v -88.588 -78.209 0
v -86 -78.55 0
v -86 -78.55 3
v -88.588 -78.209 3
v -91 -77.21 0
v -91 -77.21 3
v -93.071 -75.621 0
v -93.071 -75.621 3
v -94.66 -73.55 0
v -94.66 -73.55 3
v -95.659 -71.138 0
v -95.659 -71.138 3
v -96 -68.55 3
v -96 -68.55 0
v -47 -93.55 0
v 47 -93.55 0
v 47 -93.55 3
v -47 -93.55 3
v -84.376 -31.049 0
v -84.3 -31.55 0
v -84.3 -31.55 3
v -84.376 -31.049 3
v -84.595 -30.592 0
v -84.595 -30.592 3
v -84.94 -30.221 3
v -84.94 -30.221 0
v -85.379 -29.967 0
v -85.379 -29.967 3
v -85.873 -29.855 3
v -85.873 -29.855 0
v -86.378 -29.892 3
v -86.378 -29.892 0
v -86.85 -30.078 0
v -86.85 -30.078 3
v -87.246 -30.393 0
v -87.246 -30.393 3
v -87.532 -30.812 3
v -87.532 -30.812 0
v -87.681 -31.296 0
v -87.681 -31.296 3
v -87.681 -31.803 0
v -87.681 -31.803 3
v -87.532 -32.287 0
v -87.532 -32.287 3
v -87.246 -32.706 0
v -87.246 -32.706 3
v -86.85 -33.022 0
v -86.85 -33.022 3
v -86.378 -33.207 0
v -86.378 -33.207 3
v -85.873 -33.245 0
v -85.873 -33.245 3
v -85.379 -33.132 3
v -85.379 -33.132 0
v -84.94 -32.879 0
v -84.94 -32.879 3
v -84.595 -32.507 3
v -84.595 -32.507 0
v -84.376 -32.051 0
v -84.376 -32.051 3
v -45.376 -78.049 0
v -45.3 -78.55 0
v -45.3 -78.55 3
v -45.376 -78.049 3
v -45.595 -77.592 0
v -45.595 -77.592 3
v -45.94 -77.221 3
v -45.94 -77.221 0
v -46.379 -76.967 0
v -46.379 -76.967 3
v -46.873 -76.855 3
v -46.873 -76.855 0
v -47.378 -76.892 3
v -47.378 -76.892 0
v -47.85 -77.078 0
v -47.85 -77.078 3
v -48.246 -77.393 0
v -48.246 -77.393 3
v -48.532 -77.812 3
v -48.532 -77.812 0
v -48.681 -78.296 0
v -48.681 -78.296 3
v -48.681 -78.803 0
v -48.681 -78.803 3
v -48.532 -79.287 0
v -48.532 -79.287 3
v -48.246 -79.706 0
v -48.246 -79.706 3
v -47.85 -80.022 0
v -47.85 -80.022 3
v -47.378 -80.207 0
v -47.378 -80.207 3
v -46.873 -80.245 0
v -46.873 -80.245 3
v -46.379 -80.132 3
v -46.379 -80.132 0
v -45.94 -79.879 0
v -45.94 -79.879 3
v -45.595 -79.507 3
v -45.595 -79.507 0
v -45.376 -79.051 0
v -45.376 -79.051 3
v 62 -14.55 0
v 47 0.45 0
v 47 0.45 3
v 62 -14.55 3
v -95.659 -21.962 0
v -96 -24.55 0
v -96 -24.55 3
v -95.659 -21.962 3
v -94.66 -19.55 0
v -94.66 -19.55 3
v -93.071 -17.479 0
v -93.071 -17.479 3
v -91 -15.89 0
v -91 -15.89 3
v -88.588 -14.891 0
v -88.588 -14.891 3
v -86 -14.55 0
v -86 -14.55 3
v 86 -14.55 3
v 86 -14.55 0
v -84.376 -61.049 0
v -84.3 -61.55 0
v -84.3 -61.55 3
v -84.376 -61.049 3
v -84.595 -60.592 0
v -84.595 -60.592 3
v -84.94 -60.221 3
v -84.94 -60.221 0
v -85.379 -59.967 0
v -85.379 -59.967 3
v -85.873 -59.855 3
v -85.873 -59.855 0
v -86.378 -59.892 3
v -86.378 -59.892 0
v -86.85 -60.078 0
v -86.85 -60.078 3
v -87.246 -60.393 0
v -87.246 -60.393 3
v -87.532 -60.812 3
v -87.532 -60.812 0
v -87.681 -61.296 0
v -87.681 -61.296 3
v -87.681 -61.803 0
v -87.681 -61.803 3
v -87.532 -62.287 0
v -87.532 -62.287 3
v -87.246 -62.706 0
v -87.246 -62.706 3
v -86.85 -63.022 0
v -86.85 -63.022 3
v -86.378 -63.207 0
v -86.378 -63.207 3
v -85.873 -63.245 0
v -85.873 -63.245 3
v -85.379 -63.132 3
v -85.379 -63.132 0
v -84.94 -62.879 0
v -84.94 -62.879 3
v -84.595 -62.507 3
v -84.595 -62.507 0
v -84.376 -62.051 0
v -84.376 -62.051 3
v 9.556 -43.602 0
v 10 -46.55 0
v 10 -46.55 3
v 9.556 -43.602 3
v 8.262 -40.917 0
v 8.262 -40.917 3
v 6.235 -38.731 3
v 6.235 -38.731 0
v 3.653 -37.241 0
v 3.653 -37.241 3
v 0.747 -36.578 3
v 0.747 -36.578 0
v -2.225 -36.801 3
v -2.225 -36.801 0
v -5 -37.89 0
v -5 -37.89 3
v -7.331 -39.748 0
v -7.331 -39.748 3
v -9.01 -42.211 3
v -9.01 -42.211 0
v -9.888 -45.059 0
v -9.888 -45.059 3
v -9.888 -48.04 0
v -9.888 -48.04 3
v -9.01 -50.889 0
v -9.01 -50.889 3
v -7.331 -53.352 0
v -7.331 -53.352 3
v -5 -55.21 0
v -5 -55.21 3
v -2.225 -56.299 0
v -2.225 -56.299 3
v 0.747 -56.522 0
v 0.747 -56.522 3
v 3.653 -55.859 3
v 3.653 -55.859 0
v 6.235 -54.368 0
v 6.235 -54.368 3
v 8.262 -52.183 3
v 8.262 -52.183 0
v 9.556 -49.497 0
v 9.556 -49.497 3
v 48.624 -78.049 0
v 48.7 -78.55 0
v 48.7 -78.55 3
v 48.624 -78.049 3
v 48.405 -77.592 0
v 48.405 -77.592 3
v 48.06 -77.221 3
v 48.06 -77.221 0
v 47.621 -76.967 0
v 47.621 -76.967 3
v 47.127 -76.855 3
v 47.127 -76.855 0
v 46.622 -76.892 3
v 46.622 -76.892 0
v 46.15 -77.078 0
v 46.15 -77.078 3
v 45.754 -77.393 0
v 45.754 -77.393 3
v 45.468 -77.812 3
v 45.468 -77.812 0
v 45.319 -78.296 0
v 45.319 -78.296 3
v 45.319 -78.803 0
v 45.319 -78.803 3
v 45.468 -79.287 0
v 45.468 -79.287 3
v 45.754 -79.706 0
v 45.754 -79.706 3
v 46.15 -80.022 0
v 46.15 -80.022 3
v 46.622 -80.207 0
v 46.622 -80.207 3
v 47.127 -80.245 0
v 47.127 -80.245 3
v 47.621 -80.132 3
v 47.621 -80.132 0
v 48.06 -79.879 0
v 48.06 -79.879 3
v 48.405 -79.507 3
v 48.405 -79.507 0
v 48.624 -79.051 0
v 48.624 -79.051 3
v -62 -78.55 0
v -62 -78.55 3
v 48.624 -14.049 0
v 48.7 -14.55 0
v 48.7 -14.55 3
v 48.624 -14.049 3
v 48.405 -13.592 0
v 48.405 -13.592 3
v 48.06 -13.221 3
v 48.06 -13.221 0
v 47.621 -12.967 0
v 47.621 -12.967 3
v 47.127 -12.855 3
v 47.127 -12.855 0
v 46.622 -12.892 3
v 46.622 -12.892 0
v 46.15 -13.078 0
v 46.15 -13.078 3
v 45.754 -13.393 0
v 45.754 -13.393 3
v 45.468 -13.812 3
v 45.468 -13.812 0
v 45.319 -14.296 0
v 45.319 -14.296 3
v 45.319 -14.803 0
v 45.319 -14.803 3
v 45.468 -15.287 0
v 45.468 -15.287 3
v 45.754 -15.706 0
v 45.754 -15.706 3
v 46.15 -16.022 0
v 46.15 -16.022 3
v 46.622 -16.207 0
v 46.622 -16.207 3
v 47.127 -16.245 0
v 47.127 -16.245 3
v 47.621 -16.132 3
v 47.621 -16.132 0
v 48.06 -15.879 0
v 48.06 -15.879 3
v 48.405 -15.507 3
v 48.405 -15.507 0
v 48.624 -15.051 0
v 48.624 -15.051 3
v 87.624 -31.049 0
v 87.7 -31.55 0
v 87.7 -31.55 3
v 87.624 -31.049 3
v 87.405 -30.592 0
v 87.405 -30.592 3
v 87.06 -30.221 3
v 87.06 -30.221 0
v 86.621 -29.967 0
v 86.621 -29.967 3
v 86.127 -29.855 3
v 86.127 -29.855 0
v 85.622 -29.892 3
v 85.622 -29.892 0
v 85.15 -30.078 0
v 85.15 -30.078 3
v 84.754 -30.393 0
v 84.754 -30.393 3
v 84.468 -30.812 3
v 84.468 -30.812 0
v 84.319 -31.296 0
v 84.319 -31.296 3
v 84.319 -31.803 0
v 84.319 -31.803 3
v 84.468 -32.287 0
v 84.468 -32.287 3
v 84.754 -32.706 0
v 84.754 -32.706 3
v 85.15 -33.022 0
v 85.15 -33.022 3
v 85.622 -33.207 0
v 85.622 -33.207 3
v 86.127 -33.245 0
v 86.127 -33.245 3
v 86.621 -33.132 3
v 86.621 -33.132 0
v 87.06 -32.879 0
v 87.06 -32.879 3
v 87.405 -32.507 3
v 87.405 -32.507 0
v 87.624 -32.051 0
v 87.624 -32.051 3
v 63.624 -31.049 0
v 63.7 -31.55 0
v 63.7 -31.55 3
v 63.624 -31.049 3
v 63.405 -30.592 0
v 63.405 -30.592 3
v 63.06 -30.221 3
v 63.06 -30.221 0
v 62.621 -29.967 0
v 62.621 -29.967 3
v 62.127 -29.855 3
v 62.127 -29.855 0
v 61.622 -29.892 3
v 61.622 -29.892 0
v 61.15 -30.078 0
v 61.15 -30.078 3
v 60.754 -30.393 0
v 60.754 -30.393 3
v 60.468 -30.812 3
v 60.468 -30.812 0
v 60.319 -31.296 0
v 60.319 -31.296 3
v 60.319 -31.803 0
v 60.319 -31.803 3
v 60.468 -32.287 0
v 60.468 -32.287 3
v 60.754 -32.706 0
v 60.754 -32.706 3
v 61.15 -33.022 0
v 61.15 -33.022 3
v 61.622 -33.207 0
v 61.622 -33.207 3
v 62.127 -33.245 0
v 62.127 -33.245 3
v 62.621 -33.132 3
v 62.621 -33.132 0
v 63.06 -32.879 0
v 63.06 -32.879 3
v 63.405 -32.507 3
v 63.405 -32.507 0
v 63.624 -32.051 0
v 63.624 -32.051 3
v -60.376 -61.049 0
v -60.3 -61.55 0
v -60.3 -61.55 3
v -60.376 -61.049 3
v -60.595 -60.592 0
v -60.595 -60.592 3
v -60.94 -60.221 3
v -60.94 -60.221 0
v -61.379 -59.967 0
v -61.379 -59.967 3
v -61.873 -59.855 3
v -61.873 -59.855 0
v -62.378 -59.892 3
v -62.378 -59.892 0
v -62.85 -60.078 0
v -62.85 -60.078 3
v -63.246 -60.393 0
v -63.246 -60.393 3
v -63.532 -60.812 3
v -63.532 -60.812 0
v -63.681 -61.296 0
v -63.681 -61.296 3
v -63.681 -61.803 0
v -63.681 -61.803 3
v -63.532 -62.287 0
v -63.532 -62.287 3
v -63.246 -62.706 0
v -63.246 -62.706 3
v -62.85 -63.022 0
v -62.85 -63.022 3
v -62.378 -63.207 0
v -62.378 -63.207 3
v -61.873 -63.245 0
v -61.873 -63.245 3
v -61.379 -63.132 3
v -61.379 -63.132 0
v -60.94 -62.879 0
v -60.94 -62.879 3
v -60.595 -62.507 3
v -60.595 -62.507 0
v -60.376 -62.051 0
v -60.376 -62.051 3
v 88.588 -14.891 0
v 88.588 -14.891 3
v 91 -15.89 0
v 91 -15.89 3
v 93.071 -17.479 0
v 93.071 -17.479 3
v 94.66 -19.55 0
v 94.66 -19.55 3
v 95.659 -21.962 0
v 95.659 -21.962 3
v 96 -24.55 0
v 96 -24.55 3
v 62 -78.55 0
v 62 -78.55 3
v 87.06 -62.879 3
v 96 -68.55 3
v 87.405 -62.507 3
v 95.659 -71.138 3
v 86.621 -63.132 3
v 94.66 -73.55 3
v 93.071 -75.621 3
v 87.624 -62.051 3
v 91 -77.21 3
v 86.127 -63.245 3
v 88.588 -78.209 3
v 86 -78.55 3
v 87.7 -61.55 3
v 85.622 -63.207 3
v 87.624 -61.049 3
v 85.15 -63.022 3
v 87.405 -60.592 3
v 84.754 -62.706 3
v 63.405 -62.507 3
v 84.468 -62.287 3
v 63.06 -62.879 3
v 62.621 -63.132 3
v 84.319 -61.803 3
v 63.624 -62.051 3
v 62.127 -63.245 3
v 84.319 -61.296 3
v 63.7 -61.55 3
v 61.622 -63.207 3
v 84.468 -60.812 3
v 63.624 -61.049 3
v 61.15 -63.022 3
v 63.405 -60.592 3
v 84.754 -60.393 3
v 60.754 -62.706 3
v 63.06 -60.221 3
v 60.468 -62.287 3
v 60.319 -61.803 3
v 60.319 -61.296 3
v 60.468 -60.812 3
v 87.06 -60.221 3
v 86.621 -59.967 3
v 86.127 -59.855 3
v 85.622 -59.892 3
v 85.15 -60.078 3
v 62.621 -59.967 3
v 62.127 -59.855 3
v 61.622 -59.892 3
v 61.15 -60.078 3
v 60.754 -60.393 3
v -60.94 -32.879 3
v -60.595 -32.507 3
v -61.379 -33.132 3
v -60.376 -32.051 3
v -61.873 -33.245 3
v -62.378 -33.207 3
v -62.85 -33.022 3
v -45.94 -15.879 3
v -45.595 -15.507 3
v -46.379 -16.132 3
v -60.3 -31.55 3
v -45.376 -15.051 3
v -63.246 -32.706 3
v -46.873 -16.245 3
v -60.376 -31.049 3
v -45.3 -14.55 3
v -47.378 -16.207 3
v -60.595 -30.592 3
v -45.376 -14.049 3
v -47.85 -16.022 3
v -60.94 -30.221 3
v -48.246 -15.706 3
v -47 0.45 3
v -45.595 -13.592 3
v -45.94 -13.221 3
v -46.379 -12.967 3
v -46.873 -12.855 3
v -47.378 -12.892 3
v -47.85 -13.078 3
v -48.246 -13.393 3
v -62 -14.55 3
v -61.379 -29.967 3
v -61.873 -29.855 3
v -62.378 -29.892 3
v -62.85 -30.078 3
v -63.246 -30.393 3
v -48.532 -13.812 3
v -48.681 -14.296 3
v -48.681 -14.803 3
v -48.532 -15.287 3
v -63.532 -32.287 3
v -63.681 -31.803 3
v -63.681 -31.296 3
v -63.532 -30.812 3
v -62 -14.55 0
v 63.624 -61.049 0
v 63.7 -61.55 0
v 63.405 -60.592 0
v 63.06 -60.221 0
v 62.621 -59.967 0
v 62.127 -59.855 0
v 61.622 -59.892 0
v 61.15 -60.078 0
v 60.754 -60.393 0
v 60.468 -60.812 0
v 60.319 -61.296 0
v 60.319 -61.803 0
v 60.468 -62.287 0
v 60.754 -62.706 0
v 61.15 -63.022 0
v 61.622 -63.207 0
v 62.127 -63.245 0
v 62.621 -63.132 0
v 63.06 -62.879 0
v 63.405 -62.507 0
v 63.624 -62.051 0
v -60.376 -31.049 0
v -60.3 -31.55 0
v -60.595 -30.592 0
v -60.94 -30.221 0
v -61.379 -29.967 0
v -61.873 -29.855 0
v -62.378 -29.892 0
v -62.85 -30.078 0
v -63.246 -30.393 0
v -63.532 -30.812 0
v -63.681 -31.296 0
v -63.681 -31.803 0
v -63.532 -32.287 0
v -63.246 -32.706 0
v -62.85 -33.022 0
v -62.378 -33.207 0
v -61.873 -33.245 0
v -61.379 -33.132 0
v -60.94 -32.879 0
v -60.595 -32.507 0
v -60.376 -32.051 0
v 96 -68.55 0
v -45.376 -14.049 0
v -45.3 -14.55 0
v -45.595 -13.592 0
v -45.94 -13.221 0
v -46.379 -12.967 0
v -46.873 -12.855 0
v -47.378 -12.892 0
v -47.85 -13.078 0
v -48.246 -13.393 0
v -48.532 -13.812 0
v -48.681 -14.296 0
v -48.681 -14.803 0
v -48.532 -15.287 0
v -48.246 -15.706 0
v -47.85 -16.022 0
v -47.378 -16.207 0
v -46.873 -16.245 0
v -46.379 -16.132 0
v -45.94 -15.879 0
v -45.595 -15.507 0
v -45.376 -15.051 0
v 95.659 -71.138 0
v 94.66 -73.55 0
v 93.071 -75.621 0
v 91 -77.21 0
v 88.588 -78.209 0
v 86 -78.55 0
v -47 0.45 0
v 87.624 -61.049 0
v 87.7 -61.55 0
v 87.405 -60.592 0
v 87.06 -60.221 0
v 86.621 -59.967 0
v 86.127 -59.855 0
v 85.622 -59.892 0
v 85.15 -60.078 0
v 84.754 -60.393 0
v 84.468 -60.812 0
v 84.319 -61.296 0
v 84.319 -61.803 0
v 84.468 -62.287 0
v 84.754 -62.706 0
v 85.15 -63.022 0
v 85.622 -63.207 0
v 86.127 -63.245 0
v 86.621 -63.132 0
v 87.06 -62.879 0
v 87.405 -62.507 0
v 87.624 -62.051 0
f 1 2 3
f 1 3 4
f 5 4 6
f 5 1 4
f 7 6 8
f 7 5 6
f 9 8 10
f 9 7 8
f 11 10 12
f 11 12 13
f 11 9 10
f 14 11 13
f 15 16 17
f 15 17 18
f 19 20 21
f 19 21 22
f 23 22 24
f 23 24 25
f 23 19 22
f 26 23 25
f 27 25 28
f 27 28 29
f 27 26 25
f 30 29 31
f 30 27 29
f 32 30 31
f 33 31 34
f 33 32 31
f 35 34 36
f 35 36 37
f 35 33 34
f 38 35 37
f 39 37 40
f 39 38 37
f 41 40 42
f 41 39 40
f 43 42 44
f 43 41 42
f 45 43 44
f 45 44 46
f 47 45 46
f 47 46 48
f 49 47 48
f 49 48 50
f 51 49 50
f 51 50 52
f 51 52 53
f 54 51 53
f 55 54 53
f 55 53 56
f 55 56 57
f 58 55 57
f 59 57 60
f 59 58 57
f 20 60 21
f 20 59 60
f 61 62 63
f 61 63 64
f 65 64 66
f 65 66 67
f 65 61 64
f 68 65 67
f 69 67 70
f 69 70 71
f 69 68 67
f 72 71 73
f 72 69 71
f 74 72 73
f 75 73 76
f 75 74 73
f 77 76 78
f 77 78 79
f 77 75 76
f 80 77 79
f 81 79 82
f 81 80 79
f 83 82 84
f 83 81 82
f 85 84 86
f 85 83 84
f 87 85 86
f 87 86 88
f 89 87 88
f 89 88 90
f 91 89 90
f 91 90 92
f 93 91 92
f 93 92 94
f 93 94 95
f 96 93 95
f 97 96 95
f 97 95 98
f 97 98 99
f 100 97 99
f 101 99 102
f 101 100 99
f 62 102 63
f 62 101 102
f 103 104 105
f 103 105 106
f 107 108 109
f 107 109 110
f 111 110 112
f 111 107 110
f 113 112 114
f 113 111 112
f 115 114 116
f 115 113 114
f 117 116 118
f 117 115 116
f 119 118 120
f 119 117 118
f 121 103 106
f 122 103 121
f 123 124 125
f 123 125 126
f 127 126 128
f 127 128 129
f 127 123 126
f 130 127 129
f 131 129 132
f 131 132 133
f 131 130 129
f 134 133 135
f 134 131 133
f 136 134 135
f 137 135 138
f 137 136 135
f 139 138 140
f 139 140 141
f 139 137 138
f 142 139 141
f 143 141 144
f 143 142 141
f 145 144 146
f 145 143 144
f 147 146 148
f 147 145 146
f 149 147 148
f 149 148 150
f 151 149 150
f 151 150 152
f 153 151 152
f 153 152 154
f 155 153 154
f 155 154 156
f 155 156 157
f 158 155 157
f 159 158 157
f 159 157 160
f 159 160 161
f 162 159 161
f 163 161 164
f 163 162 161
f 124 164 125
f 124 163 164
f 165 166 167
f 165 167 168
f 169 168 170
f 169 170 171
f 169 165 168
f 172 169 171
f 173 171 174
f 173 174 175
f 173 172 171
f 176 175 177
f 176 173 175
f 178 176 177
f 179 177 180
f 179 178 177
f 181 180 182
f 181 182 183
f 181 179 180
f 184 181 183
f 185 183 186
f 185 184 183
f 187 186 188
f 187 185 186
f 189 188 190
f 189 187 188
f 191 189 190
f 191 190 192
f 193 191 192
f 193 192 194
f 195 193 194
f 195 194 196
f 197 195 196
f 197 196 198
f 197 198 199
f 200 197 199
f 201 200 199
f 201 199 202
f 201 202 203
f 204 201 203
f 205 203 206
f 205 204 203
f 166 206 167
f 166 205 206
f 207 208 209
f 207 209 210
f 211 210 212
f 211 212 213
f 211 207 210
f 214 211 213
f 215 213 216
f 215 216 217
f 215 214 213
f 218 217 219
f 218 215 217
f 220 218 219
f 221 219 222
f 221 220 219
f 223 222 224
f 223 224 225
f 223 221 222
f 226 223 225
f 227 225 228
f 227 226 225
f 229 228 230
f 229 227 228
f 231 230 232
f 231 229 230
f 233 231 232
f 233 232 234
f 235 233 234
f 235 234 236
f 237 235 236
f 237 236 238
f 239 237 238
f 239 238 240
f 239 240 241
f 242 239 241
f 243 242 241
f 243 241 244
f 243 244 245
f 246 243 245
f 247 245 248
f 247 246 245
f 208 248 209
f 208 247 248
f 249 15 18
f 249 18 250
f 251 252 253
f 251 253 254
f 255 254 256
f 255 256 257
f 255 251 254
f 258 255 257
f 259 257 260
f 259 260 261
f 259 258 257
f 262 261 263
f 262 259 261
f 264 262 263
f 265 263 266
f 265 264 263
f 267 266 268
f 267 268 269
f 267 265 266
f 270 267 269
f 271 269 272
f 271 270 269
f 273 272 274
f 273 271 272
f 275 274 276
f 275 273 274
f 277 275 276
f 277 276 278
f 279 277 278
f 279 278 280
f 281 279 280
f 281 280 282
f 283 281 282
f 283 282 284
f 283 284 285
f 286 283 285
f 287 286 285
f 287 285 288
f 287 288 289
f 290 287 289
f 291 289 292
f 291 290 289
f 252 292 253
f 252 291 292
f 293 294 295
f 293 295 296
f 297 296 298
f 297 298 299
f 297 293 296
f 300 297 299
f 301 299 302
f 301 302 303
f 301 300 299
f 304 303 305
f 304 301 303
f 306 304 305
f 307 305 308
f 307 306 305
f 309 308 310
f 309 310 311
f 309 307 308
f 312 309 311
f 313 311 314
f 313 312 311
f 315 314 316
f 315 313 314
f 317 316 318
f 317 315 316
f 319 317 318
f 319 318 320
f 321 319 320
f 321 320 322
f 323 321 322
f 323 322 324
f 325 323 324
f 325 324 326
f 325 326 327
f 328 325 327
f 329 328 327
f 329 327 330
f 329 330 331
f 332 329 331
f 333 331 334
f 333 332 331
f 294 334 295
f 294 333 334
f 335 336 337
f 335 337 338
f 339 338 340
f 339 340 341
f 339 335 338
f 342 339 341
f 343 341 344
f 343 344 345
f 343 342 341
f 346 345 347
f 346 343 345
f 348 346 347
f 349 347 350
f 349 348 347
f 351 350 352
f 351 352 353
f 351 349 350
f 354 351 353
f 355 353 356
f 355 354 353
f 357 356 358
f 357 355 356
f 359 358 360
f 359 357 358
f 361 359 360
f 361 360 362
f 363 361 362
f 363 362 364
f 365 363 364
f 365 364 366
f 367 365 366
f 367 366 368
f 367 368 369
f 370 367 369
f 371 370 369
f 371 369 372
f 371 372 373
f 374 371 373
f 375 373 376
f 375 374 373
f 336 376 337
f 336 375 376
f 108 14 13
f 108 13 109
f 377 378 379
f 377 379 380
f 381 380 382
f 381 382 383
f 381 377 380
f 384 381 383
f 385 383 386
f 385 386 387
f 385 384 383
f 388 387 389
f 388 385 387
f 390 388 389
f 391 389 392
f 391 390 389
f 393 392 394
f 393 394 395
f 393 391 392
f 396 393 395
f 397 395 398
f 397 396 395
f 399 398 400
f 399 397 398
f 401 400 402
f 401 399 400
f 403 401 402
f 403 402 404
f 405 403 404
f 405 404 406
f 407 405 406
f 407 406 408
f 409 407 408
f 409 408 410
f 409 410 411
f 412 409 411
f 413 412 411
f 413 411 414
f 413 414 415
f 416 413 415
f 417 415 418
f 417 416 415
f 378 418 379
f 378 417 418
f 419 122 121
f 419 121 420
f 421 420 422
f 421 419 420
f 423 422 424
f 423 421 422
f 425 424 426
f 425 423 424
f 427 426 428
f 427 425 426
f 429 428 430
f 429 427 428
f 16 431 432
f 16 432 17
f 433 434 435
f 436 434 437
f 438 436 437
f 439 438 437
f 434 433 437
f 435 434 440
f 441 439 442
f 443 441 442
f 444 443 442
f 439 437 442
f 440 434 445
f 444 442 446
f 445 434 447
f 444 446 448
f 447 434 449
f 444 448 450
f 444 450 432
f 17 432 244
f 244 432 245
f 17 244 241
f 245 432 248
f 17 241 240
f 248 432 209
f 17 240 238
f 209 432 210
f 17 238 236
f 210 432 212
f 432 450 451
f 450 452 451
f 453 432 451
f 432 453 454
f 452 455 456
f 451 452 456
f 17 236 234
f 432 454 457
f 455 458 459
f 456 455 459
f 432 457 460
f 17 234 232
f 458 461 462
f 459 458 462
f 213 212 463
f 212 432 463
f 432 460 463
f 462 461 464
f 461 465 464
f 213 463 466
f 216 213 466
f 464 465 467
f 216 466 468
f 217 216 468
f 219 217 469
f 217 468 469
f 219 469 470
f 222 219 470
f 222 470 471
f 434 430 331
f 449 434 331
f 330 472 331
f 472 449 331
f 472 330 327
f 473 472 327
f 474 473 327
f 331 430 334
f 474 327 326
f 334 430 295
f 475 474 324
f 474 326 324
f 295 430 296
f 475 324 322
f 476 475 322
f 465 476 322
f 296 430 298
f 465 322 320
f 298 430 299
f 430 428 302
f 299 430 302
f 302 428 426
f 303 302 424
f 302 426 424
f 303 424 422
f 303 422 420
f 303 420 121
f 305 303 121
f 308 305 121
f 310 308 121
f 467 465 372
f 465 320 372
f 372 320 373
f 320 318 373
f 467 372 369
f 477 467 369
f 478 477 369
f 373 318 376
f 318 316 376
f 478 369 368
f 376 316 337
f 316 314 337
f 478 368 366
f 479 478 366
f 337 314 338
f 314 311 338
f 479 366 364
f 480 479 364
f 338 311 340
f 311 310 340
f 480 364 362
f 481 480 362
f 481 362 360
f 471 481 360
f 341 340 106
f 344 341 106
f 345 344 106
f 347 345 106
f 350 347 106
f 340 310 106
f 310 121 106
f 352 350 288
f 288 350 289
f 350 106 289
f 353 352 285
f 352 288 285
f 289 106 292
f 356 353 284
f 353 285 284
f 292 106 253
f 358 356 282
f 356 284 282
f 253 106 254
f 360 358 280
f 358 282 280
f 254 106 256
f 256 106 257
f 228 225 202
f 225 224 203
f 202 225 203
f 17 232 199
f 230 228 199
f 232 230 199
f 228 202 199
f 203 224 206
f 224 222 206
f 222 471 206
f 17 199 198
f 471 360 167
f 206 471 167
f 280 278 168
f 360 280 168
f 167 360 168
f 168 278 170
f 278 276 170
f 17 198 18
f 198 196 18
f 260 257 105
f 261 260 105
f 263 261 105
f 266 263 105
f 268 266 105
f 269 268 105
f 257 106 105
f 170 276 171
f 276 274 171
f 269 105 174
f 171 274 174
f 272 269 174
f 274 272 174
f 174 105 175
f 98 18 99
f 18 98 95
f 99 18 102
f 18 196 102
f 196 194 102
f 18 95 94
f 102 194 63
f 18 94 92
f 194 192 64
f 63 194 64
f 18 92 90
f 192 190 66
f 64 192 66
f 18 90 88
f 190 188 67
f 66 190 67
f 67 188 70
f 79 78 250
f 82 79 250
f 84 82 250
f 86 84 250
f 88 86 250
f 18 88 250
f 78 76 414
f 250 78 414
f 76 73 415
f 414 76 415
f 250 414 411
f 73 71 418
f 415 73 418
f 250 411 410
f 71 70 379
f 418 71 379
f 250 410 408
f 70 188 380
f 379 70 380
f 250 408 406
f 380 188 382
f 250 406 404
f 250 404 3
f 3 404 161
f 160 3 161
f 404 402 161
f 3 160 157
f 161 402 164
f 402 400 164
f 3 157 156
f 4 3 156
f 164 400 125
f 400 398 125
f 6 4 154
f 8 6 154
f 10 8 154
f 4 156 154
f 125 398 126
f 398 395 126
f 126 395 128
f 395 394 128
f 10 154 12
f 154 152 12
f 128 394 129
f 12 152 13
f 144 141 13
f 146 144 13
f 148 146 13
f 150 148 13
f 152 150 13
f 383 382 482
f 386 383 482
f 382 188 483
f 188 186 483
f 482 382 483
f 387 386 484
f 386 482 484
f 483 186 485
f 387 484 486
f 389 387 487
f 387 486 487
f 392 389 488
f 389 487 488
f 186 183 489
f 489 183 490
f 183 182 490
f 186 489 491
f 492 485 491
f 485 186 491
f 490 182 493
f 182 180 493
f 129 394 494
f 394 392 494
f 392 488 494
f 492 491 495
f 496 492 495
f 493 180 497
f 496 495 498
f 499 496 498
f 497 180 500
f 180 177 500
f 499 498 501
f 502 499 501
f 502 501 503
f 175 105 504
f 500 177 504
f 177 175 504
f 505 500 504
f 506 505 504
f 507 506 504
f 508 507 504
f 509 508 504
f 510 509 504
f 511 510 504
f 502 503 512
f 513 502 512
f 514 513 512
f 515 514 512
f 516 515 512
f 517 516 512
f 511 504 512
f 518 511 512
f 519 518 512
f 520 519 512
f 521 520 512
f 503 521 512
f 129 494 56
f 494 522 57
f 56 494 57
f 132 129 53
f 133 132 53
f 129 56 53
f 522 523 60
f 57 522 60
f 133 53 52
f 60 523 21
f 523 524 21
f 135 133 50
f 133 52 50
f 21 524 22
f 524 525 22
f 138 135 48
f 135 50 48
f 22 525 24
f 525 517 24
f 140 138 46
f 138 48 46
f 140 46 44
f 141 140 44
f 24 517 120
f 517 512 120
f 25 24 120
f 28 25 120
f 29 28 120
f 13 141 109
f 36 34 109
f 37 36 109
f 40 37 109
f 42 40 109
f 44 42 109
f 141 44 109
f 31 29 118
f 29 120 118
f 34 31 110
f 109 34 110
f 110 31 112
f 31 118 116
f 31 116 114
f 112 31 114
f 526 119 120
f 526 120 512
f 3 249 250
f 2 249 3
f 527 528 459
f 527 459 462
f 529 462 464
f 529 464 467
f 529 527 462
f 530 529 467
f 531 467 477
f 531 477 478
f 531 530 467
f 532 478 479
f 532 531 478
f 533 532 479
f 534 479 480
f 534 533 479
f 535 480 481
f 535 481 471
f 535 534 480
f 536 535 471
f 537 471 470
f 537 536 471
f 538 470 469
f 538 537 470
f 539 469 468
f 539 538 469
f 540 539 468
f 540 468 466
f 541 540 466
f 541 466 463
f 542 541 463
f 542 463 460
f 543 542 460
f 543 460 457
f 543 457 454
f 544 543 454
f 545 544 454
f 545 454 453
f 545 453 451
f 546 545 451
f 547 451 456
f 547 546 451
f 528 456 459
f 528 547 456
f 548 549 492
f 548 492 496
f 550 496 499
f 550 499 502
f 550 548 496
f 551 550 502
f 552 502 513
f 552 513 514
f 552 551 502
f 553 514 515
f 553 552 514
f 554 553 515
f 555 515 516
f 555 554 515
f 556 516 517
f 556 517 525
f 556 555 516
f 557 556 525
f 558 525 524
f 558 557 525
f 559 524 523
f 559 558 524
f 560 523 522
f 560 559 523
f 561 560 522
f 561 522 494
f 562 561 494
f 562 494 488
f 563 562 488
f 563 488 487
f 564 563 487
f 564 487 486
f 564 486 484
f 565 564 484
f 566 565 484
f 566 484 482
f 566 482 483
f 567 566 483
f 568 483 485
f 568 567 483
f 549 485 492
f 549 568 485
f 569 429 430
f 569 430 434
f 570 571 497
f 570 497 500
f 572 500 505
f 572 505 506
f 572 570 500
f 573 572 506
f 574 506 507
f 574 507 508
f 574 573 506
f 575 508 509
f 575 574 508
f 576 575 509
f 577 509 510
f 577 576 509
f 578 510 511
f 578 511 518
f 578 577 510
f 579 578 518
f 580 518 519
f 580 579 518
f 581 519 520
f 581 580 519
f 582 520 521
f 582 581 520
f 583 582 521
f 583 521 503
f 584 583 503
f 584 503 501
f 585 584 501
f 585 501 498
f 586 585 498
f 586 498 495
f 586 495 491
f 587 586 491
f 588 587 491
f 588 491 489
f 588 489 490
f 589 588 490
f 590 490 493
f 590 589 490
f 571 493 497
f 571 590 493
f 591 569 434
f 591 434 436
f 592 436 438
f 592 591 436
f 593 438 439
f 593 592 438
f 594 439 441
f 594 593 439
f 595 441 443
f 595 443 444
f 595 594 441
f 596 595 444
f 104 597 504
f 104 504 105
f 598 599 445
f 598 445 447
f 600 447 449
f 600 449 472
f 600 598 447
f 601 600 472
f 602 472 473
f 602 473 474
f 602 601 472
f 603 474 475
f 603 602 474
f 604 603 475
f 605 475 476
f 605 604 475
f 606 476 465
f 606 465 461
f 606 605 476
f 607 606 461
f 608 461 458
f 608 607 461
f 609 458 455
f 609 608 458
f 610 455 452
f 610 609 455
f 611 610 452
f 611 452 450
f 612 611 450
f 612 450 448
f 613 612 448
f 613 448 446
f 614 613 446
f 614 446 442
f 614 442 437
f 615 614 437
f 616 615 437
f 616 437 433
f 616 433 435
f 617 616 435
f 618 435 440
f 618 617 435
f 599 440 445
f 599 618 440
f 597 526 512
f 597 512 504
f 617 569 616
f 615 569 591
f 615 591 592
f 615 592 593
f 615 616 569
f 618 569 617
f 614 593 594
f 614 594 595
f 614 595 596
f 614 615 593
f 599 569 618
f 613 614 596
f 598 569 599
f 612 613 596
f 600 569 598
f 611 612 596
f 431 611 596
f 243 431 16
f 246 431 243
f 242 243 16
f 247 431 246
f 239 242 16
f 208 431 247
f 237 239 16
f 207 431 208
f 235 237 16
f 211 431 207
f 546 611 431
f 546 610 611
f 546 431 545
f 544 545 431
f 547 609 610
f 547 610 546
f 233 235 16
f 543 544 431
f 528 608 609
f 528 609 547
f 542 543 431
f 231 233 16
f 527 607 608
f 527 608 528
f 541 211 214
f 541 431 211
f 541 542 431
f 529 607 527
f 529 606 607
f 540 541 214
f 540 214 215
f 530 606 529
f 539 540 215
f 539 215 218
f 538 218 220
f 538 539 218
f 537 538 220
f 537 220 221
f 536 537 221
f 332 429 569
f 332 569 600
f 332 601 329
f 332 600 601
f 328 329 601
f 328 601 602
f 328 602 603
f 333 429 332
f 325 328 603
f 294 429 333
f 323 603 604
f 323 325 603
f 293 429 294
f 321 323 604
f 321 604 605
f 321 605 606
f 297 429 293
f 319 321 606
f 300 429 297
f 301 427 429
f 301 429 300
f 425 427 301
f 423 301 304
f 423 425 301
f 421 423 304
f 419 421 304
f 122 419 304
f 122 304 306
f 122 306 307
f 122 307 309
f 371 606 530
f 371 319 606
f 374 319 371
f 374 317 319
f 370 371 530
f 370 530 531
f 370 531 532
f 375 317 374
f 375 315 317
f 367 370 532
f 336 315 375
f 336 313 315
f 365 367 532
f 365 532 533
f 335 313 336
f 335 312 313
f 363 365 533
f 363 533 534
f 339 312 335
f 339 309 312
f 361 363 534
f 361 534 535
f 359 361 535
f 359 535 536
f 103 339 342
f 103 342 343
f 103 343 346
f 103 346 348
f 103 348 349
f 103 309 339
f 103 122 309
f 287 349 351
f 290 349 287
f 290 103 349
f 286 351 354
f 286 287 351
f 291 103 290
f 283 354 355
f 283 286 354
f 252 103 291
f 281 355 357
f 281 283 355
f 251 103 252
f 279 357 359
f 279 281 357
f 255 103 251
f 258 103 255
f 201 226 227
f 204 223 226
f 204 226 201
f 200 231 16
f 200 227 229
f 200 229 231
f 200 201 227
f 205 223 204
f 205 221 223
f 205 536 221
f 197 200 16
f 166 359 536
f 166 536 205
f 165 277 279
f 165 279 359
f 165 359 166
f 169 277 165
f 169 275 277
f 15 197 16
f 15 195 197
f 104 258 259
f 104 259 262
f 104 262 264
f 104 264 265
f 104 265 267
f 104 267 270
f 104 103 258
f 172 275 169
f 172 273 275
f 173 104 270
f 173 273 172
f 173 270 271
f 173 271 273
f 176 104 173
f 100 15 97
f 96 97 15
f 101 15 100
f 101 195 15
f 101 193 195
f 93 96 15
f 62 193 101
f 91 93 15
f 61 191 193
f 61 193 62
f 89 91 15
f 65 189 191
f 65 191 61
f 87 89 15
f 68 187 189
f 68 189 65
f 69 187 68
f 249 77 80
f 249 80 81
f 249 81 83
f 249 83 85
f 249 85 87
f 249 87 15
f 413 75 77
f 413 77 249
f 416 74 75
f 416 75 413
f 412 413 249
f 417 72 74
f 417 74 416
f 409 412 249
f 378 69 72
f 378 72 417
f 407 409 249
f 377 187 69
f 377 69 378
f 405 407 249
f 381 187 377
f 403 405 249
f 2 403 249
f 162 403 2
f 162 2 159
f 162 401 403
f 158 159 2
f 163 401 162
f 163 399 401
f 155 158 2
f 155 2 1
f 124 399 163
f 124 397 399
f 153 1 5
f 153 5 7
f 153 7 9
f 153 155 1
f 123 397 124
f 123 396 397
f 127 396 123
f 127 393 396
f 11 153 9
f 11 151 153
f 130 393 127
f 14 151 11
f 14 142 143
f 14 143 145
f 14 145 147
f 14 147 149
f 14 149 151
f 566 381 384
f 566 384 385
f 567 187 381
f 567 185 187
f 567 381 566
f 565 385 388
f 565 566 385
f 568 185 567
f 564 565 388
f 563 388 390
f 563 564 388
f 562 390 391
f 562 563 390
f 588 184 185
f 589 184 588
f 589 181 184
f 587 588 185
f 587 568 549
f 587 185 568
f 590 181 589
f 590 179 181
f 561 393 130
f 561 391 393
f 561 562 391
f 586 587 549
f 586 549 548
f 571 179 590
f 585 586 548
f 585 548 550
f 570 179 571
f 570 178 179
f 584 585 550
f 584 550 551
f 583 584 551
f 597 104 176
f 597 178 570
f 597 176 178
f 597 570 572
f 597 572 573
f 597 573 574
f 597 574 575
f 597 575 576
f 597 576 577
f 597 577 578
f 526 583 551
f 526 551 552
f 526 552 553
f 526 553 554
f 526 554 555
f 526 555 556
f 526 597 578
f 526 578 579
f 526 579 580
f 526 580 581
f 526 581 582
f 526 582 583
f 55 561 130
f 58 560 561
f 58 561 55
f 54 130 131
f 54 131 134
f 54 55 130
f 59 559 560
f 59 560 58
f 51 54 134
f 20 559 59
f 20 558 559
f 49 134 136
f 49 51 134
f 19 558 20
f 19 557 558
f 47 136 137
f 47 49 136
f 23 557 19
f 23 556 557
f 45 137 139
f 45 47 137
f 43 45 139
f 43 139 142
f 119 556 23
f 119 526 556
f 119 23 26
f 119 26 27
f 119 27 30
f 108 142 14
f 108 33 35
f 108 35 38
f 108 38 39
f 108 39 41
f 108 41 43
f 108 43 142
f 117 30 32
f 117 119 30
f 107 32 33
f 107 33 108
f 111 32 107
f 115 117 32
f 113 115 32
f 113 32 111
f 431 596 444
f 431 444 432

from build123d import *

# Parameters (mm, degrees)
SKETCH2_R           = 1.699999998
SKETCH2_R_2         = 1.699999999
SKETCH2_R_3         = 10
SKETCH2_R_4         = 1.7
BOSS_EXTRUDE4_DEPTH = 3


with BuildPart() as part:
    # Sketch2 → Boss-Extrude4 (new body)
    with BuildSketch(Plane.XY):
        with BuildLine():
            Line((-62, -14.549788982), (-47, 0.450211018))
            Line((-47, 0.450211018), (47, 0.450211018))
            Line((47, 0.450211018), (62, -14.549788982))
            Line((62, -14.549788982), (86, -14.549788982))
            ThreePointArc((86, -14.549788982), (93.071067812, -17.47872117), (96, -24.549788982))
            Line((96, -24.549788982), (96, -68.549788982))
            ThreePointArc((96, -68.549788982), (93.071067812, -75.620856793), (86, -78.549788982))
            Line((86, -78.549788982), (62, -78.549788982))
            Line((62, -78.549788982), (47, -93.549788982))
            Line((47, -93.549788982), (-47, -93.549788982))
            Line((-47, -93.549788982), (-62, -78.549788982))
            Line((-62, -78.549788982), (-86, -78.549788982))
            ThreePointArc((-86, -78.549788982), (-93.071067812, -75.620856793), (-96, -68.549788982))
            Line((-96, -68.549788982), (-96, -24.549788982))
            ThreePointArc((-96, -24.549788982), (-93.071067812, -17.47872117), (-86, -14.549788982))
            Line((-86, -14.549788982), (-62, -14.549788982))
        make_face()
        with Locations((-62, -31.549788982)):
            Circle(SKETCH2_R, mode=Mode.SUBTRACT)
        with Locations((-86, -31.549788982)):
            Circle(SKETCH2_R, mode=Mode.SUBTRACT)
        with Locations((-86, -61.549788982)):
            Circle(SKETCH2_R, mode=Mode.SUBTRACT)
        with Locations((-62, -61.549788982)):
            Circle(SKETCH2_R, mode=Mode.SUBTRACT)
        with Locations((86, -61.549788982)):
            Circle(SKETCH2_R_2, mode=Mode.SUBTRACT)
        with Locations((62, -61.549788982)):
            Circle(SKETCH2_R_2, mode=Mode.SUBTRACT)
        with Locations((86, -31.549788982)):
            Circle(SKETCH2_R_2, mode=Mode.SUBTRACT)
        with Locations((62, -31.549788982)):
            Circle(SKETCH2_R_2, mode=Mode.SUBTRACT)
        with Locations((0, -46.549788982)):
            Circle(SKETCH2_R_3, mode=Mode.SUBTRACT)
        with Locations((-47, -14.549788982)):
            Circle(SKETCH2_R_4, mode=Mode.SUBTRACT)
        with Locations((-47, -78.549788982)):
            Circle(SKETCH2_R_4, mode=Mode.SUBTRACT)
        with Locations((47, -78.549788982)):
            Circle(SKETCH2_R_4, mode=Mode.SUBTRACT)
        with Locations((47, -14.549788982)):
            Circle(SKETCH2_R_4, mode=Mode.SUBTRACT)
    extrude(amount=BOSS_EXTRUDE4_DEPTH)


solid = part.part
